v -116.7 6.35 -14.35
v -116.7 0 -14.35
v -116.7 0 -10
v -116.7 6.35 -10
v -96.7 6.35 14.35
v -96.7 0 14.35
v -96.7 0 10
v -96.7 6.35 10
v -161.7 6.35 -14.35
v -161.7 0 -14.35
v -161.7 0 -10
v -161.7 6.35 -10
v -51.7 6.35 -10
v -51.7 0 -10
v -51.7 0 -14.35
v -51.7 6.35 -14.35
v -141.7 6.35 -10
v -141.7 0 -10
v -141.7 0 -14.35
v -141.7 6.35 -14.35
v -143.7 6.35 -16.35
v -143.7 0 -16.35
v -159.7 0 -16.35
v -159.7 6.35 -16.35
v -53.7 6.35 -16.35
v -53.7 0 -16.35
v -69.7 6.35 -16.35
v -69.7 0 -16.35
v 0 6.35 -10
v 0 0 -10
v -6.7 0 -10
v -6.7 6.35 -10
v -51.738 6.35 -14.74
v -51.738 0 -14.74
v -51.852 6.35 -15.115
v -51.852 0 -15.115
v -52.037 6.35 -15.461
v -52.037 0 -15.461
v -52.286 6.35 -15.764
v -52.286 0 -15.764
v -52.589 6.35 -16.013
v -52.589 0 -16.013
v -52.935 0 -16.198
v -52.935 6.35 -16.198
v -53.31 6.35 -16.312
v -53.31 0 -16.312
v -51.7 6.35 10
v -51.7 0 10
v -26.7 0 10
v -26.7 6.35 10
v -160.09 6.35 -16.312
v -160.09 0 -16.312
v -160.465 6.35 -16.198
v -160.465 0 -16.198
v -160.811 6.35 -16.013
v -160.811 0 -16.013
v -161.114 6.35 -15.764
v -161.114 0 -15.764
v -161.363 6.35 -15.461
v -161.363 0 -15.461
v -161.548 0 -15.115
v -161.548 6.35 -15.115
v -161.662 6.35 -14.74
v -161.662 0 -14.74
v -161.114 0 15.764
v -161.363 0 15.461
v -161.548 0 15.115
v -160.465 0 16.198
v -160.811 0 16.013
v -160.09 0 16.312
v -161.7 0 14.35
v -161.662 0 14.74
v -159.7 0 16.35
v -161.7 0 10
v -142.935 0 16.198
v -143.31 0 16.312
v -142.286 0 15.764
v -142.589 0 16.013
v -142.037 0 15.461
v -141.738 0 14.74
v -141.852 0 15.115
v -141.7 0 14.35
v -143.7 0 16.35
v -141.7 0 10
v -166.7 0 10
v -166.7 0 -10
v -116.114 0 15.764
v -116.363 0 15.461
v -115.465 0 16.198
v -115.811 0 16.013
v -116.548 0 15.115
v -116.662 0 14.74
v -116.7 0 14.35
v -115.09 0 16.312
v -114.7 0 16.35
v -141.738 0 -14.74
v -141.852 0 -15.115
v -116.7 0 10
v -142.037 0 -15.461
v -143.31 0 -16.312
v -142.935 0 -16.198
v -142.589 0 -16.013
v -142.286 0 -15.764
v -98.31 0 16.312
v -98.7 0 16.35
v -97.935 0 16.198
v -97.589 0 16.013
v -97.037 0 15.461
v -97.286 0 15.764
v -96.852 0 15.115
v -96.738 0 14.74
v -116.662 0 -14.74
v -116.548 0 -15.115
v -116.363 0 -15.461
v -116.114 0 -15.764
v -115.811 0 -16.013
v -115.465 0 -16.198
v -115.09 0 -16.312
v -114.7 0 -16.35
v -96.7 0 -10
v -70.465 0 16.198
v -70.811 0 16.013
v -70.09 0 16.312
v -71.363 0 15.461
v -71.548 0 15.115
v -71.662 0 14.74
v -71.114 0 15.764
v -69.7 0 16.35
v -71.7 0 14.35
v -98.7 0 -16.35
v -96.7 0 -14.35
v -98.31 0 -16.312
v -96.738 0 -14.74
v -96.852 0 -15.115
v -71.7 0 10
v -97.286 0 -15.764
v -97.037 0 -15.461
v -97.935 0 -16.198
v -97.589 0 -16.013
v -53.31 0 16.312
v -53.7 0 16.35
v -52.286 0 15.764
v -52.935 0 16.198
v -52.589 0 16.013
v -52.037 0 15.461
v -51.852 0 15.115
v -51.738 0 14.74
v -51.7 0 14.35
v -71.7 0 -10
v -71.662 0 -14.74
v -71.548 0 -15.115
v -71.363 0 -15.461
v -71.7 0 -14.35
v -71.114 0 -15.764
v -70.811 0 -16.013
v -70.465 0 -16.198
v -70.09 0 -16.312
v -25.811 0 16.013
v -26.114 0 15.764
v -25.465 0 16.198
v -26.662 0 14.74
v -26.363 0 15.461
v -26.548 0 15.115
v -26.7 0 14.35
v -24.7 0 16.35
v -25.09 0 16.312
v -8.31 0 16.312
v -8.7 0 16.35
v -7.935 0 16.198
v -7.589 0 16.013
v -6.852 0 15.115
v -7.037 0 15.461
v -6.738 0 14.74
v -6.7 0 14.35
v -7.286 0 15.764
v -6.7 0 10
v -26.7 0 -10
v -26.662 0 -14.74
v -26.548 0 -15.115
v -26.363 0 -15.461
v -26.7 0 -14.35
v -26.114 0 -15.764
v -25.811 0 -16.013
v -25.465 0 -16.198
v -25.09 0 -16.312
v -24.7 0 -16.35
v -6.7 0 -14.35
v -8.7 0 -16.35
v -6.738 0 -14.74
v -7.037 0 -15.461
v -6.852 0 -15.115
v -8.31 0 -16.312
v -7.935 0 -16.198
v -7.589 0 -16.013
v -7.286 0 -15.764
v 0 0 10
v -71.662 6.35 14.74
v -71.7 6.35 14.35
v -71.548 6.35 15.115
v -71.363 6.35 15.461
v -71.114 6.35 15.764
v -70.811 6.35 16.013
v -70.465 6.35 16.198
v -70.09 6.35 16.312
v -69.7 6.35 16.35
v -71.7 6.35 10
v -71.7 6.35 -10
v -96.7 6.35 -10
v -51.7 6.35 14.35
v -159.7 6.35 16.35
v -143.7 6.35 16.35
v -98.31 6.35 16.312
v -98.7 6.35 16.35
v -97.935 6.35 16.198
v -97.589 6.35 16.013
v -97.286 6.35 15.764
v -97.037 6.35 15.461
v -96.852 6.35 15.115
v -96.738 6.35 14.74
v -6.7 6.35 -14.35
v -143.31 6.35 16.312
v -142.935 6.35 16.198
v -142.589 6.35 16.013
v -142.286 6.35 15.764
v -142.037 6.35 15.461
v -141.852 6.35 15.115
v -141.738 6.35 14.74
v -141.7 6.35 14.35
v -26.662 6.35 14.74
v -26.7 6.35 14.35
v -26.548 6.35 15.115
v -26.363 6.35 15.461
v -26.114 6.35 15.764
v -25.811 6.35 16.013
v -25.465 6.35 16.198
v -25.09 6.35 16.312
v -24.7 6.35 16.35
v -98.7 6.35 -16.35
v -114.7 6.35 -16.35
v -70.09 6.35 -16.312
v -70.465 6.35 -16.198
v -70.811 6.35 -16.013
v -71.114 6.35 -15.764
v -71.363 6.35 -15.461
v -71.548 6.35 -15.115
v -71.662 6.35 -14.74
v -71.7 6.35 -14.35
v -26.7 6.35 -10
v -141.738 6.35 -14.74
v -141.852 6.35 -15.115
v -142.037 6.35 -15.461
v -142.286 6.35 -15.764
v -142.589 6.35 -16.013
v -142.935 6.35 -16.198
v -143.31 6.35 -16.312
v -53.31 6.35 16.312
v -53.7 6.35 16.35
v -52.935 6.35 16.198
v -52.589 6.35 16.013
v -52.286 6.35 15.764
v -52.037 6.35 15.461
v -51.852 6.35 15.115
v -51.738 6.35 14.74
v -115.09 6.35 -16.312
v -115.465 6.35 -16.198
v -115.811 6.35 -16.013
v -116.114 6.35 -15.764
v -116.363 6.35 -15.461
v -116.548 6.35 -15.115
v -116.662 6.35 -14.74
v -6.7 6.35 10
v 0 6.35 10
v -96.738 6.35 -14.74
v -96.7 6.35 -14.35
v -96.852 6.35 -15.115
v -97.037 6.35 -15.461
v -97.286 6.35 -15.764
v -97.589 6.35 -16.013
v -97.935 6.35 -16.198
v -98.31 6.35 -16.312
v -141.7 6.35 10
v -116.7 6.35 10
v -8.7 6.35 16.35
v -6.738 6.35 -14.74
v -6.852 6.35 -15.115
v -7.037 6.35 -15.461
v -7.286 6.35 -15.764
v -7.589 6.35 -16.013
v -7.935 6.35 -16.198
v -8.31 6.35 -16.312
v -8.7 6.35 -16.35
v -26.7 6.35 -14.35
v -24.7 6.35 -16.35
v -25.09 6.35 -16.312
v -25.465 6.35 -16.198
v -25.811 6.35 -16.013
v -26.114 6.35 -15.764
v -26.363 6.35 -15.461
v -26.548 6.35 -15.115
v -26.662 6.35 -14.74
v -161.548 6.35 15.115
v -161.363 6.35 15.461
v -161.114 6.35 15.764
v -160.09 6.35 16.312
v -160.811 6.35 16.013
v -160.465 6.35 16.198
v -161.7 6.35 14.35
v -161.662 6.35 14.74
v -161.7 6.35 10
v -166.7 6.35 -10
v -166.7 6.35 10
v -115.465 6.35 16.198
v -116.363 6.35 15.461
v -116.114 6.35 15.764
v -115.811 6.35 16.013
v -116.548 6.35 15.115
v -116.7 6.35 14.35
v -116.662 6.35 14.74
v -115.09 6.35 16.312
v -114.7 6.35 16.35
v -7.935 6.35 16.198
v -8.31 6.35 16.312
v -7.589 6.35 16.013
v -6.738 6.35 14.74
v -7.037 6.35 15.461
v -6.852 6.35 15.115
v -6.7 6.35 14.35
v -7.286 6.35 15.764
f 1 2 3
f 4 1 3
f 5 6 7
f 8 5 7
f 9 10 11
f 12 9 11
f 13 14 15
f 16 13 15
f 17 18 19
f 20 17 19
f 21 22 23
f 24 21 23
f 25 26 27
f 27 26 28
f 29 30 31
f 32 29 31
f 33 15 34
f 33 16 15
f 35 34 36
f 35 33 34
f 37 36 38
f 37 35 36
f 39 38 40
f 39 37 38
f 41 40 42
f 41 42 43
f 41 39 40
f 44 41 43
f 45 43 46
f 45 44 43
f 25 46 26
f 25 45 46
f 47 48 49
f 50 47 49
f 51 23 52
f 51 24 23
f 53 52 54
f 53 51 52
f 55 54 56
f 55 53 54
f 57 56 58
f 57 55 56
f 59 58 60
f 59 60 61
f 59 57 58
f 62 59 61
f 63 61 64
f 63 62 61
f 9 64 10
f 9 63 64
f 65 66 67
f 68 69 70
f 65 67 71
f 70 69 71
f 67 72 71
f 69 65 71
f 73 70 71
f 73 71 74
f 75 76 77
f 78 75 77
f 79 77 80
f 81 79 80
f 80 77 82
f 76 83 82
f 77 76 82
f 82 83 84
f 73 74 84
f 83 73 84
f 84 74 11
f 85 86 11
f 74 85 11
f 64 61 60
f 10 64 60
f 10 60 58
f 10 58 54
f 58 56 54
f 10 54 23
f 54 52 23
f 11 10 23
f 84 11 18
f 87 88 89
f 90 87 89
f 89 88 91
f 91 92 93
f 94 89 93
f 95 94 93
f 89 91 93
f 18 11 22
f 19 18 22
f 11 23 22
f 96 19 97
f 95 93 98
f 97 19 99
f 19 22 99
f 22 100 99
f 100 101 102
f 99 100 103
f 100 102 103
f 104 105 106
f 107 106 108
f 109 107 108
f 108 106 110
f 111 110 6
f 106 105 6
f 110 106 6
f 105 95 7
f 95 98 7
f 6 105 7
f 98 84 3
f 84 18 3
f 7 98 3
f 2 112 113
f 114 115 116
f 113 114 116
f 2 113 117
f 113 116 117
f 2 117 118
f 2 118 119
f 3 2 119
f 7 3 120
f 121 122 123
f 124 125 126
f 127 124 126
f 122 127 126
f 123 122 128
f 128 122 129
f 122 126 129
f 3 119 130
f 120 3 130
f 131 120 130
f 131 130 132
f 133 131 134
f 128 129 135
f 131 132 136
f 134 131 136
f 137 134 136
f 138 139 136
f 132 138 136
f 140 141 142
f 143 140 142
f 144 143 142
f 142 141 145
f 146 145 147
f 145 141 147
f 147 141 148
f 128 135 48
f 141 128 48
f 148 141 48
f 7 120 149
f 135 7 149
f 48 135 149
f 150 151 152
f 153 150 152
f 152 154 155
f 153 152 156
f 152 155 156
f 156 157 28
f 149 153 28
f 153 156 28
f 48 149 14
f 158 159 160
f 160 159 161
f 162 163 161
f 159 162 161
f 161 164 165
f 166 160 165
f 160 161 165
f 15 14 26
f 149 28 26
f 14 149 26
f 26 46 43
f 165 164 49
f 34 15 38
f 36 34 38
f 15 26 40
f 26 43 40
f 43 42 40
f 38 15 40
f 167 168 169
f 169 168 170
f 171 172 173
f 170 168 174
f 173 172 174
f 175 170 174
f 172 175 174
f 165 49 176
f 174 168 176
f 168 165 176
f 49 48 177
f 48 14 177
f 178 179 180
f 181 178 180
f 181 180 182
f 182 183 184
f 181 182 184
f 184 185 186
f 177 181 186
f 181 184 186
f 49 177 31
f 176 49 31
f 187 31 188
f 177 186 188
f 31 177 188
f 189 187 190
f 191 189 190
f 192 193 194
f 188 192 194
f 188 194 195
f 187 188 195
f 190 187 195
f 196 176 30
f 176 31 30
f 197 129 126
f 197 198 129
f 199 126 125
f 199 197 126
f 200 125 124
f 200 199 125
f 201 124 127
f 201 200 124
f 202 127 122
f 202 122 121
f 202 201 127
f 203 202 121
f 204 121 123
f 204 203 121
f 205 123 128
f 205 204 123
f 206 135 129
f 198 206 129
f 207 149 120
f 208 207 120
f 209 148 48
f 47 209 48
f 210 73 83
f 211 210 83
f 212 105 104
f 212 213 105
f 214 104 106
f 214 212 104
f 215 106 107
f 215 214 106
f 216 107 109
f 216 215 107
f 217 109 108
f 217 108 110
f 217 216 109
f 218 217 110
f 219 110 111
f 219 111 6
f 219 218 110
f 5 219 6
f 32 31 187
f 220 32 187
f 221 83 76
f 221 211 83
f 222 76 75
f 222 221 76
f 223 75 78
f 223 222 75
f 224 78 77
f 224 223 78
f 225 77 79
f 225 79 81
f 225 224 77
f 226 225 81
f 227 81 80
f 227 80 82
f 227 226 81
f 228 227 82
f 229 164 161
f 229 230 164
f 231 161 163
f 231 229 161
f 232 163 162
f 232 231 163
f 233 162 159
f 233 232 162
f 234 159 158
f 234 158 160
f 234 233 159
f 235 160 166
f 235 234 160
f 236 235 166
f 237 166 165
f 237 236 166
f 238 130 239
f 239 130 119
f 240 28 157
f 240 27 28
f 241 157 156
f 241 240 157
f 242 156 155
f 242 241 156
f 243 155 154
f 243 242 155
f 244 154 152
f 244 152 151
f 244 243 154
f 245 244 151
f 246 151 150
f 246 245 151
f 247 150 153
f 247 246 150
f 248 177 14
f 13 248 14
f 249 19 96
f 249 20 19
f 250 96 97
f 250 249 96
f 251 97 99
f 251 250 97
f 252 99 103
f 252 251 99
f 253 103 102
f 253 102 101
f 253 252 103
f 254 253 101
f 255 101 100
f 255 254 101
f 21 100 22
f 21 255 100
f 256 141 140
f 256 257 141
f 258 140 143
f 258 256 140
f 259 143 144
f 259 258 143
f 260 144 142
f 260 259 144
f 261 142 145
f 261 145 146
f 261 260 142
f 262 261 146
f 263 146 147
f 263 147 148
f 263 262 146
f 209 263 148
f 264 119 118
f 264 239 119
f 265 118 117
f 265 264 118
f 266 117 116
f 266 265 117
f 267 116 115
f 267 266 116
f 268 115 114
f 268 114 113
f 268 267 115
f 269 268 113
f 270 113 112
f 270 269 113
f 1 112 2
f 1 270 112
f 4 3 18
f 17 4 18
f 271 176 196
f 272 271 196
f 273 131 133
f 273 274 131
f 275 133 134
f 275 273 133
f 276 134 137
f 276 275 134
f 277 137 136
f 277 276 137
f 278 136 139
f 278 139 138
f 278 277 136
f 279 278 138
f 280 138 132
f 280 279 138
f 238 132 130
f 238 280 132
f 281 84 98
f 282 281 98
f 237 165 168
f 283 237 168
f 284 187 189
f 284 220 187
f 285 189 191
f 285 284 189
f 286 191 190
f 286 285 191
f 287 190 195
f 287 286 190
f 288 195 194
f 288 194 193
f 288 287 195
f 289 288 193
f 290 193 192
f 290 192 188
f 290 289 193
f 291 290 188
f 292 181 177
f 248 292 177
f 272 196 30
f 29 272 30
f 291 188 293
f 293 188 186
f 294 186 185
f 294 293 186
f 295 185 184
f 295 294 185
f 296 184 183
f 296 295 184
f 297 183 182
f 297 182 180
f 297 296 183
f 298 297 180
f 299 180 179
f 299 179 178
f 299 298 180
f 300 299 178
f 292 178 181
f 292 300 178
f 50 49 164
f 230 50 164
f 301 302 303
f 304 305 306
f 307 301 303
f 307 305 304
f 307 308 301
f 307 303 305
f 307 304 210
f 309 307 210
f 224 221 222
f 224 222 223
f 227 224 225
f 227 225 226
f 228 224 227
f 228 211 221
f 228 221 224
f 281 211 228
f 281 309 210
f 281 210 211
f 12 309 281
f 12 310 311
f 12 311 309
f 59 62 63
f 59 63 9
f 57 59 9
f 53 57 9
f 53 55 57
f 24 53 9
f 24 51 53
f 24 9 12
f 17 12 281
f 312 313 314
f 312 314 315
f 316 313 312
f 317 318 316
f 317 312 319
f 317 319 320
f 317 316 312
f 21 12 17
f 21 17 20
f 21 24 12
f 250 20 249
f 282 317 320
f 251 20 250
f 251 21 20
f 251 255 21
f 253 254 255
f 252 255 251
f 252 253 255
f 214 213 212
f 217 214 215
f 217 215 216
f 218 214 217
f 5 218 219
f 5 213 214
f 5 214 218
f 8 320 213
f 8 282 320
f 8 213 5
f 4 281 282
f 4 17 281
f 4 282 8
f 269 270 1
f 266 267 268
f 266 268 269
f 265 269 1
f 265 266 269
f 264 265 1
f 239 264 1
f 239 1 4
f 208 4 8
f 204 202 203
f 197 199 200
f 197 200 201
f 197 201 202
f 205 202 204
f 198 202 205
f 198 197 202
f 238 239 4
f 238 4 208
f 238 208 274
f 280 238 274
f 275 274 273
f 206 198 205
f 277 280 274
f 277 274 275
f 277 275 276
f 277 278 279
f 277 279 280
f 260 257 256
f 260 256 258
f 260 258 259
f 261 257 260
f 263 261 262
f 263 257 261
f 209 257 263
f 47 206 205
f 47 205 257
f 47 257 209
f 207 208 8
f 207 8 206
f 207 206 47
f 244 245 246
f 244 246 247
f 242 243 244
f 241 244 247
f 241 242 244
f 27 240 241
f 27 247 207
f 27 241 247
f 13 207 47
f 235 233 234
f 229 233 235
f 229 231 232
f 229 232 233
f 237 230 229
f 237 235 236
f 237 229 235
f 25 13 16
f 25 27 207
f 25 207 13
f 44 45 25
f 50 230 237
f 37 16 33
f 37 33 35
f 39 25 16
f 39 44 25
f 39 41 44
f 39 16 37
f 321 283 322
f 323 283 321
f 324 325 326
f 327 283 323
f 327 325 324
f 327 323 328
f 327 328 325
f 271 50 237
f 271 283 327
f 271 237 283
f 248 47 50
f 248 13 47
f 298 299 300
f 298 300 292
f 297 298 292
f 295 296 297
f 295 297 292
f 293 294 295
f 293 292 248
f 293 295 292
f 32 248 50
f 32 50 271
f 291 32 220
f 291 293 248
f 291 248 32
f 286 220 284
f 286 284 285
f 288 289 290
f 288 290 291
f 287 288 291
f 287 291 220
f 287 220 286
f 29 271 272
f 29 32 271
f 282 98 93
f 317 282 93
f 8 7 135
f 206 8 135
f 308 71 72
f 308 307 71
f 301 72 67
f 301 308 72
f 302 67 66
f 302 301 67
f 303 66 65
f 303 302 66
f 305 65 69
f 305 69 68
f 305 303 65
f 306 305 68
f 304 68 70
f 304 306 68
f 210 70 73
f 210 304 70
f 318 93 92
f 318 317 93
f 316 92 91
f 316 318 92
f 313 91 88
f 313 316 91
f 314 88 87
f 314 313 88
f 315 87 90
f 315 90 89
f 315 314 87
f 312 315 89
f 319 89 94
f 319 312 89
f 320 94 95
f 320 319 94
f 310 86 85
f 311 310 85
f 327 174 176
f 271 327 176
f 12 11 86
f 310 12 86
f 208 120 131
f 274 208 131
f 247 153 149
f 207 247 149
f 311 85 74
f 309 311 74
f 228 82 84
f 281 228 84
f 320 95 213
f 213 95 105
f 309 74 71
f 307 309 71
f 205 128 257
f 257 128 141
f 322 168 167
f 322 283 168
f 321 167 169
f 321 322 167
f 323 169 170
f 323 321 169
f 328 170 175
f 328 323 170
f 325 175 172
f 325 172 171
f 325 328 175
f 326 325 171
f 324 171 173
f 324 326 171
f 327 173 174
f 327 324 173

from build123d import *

# Parameters (mm, degrees)
BOSS_EXTRUDE1_DEPTH = 6.35
FILLET1_R           = 2


with BuildPart() as part:
    # Sketch1 → Boss-Extrude1 (new body)
    with BuildSketch(Plane(origin=(0, 0, 0), x_dir=(1, 0, 0), z_dir=(0, 1, 0))):
        Polygon((0, 0), (0, 10), (-6.7, 10), (-6.7, 16.35), (-26.7, 16.35), (-26.7, 10), (-51.7, 10), (-51.7, 16.35), (-71.7, 16.35), (-71.7, 10), (-96.7, 10), (-96.7, 16.35), (-116.7, 16.35), (-116.7, 10), (-141.7, 10), (-141.7, 16.35), (-161.7, 16.35), (-161.7, 10), (-166.7, 10), (-166.7, 0), (-166.7, -10), (-161.7, -10), (-161.7, -16.35), (-141.7, -16.35), (-141.7, -10), (-116.7, -10), (-116.7, -16.35), (-96.7, -16.35), (-96.7, -10), (-71.7, -10), (-71.7, -16.35), (-51.7, -16.35), (-51.7, -10), (-26.7, -10), (-26.7, -16.35), (-6.7, -16.35), (-6.7, -10), (0, -10), align=None)
    extrude(amount=BOSS_EXTRUDE1_DEPTH)

    # Fillet1
    fillet1_edges = [part.edges().sort_by_distance(p)[0] for p in [
        (-6.7, 3.175, 16.35),
        (-26.7, 3.175, 16.35),
        (-51.7, 3.175, 16.35),
        (-71.7, 3.175, 16.35),
        (-96.7, 3.175, 16.35),
        (-116.7, 3.175, 16.35),
        (-141.7, 3.175, 16.35),
        (-161.7, 3.175, 16.35),
        (-161.7, 3.175, -16.35),
        (-141.7, 3.175, -16.35),
        (-116.7, 3.175, -16.35),
        (-96.7, 3.175, -16.35),
        (-71.7, 3.175, -16.35),
        (-51.7, 3.175, -16.35),
        (-26.7, 3.175, -16.35),
        (-6.7, 3.175, -16.35),
    ]]
    fillet(fillet1_edges, radius=FILLET1_R)


solid = part.part
